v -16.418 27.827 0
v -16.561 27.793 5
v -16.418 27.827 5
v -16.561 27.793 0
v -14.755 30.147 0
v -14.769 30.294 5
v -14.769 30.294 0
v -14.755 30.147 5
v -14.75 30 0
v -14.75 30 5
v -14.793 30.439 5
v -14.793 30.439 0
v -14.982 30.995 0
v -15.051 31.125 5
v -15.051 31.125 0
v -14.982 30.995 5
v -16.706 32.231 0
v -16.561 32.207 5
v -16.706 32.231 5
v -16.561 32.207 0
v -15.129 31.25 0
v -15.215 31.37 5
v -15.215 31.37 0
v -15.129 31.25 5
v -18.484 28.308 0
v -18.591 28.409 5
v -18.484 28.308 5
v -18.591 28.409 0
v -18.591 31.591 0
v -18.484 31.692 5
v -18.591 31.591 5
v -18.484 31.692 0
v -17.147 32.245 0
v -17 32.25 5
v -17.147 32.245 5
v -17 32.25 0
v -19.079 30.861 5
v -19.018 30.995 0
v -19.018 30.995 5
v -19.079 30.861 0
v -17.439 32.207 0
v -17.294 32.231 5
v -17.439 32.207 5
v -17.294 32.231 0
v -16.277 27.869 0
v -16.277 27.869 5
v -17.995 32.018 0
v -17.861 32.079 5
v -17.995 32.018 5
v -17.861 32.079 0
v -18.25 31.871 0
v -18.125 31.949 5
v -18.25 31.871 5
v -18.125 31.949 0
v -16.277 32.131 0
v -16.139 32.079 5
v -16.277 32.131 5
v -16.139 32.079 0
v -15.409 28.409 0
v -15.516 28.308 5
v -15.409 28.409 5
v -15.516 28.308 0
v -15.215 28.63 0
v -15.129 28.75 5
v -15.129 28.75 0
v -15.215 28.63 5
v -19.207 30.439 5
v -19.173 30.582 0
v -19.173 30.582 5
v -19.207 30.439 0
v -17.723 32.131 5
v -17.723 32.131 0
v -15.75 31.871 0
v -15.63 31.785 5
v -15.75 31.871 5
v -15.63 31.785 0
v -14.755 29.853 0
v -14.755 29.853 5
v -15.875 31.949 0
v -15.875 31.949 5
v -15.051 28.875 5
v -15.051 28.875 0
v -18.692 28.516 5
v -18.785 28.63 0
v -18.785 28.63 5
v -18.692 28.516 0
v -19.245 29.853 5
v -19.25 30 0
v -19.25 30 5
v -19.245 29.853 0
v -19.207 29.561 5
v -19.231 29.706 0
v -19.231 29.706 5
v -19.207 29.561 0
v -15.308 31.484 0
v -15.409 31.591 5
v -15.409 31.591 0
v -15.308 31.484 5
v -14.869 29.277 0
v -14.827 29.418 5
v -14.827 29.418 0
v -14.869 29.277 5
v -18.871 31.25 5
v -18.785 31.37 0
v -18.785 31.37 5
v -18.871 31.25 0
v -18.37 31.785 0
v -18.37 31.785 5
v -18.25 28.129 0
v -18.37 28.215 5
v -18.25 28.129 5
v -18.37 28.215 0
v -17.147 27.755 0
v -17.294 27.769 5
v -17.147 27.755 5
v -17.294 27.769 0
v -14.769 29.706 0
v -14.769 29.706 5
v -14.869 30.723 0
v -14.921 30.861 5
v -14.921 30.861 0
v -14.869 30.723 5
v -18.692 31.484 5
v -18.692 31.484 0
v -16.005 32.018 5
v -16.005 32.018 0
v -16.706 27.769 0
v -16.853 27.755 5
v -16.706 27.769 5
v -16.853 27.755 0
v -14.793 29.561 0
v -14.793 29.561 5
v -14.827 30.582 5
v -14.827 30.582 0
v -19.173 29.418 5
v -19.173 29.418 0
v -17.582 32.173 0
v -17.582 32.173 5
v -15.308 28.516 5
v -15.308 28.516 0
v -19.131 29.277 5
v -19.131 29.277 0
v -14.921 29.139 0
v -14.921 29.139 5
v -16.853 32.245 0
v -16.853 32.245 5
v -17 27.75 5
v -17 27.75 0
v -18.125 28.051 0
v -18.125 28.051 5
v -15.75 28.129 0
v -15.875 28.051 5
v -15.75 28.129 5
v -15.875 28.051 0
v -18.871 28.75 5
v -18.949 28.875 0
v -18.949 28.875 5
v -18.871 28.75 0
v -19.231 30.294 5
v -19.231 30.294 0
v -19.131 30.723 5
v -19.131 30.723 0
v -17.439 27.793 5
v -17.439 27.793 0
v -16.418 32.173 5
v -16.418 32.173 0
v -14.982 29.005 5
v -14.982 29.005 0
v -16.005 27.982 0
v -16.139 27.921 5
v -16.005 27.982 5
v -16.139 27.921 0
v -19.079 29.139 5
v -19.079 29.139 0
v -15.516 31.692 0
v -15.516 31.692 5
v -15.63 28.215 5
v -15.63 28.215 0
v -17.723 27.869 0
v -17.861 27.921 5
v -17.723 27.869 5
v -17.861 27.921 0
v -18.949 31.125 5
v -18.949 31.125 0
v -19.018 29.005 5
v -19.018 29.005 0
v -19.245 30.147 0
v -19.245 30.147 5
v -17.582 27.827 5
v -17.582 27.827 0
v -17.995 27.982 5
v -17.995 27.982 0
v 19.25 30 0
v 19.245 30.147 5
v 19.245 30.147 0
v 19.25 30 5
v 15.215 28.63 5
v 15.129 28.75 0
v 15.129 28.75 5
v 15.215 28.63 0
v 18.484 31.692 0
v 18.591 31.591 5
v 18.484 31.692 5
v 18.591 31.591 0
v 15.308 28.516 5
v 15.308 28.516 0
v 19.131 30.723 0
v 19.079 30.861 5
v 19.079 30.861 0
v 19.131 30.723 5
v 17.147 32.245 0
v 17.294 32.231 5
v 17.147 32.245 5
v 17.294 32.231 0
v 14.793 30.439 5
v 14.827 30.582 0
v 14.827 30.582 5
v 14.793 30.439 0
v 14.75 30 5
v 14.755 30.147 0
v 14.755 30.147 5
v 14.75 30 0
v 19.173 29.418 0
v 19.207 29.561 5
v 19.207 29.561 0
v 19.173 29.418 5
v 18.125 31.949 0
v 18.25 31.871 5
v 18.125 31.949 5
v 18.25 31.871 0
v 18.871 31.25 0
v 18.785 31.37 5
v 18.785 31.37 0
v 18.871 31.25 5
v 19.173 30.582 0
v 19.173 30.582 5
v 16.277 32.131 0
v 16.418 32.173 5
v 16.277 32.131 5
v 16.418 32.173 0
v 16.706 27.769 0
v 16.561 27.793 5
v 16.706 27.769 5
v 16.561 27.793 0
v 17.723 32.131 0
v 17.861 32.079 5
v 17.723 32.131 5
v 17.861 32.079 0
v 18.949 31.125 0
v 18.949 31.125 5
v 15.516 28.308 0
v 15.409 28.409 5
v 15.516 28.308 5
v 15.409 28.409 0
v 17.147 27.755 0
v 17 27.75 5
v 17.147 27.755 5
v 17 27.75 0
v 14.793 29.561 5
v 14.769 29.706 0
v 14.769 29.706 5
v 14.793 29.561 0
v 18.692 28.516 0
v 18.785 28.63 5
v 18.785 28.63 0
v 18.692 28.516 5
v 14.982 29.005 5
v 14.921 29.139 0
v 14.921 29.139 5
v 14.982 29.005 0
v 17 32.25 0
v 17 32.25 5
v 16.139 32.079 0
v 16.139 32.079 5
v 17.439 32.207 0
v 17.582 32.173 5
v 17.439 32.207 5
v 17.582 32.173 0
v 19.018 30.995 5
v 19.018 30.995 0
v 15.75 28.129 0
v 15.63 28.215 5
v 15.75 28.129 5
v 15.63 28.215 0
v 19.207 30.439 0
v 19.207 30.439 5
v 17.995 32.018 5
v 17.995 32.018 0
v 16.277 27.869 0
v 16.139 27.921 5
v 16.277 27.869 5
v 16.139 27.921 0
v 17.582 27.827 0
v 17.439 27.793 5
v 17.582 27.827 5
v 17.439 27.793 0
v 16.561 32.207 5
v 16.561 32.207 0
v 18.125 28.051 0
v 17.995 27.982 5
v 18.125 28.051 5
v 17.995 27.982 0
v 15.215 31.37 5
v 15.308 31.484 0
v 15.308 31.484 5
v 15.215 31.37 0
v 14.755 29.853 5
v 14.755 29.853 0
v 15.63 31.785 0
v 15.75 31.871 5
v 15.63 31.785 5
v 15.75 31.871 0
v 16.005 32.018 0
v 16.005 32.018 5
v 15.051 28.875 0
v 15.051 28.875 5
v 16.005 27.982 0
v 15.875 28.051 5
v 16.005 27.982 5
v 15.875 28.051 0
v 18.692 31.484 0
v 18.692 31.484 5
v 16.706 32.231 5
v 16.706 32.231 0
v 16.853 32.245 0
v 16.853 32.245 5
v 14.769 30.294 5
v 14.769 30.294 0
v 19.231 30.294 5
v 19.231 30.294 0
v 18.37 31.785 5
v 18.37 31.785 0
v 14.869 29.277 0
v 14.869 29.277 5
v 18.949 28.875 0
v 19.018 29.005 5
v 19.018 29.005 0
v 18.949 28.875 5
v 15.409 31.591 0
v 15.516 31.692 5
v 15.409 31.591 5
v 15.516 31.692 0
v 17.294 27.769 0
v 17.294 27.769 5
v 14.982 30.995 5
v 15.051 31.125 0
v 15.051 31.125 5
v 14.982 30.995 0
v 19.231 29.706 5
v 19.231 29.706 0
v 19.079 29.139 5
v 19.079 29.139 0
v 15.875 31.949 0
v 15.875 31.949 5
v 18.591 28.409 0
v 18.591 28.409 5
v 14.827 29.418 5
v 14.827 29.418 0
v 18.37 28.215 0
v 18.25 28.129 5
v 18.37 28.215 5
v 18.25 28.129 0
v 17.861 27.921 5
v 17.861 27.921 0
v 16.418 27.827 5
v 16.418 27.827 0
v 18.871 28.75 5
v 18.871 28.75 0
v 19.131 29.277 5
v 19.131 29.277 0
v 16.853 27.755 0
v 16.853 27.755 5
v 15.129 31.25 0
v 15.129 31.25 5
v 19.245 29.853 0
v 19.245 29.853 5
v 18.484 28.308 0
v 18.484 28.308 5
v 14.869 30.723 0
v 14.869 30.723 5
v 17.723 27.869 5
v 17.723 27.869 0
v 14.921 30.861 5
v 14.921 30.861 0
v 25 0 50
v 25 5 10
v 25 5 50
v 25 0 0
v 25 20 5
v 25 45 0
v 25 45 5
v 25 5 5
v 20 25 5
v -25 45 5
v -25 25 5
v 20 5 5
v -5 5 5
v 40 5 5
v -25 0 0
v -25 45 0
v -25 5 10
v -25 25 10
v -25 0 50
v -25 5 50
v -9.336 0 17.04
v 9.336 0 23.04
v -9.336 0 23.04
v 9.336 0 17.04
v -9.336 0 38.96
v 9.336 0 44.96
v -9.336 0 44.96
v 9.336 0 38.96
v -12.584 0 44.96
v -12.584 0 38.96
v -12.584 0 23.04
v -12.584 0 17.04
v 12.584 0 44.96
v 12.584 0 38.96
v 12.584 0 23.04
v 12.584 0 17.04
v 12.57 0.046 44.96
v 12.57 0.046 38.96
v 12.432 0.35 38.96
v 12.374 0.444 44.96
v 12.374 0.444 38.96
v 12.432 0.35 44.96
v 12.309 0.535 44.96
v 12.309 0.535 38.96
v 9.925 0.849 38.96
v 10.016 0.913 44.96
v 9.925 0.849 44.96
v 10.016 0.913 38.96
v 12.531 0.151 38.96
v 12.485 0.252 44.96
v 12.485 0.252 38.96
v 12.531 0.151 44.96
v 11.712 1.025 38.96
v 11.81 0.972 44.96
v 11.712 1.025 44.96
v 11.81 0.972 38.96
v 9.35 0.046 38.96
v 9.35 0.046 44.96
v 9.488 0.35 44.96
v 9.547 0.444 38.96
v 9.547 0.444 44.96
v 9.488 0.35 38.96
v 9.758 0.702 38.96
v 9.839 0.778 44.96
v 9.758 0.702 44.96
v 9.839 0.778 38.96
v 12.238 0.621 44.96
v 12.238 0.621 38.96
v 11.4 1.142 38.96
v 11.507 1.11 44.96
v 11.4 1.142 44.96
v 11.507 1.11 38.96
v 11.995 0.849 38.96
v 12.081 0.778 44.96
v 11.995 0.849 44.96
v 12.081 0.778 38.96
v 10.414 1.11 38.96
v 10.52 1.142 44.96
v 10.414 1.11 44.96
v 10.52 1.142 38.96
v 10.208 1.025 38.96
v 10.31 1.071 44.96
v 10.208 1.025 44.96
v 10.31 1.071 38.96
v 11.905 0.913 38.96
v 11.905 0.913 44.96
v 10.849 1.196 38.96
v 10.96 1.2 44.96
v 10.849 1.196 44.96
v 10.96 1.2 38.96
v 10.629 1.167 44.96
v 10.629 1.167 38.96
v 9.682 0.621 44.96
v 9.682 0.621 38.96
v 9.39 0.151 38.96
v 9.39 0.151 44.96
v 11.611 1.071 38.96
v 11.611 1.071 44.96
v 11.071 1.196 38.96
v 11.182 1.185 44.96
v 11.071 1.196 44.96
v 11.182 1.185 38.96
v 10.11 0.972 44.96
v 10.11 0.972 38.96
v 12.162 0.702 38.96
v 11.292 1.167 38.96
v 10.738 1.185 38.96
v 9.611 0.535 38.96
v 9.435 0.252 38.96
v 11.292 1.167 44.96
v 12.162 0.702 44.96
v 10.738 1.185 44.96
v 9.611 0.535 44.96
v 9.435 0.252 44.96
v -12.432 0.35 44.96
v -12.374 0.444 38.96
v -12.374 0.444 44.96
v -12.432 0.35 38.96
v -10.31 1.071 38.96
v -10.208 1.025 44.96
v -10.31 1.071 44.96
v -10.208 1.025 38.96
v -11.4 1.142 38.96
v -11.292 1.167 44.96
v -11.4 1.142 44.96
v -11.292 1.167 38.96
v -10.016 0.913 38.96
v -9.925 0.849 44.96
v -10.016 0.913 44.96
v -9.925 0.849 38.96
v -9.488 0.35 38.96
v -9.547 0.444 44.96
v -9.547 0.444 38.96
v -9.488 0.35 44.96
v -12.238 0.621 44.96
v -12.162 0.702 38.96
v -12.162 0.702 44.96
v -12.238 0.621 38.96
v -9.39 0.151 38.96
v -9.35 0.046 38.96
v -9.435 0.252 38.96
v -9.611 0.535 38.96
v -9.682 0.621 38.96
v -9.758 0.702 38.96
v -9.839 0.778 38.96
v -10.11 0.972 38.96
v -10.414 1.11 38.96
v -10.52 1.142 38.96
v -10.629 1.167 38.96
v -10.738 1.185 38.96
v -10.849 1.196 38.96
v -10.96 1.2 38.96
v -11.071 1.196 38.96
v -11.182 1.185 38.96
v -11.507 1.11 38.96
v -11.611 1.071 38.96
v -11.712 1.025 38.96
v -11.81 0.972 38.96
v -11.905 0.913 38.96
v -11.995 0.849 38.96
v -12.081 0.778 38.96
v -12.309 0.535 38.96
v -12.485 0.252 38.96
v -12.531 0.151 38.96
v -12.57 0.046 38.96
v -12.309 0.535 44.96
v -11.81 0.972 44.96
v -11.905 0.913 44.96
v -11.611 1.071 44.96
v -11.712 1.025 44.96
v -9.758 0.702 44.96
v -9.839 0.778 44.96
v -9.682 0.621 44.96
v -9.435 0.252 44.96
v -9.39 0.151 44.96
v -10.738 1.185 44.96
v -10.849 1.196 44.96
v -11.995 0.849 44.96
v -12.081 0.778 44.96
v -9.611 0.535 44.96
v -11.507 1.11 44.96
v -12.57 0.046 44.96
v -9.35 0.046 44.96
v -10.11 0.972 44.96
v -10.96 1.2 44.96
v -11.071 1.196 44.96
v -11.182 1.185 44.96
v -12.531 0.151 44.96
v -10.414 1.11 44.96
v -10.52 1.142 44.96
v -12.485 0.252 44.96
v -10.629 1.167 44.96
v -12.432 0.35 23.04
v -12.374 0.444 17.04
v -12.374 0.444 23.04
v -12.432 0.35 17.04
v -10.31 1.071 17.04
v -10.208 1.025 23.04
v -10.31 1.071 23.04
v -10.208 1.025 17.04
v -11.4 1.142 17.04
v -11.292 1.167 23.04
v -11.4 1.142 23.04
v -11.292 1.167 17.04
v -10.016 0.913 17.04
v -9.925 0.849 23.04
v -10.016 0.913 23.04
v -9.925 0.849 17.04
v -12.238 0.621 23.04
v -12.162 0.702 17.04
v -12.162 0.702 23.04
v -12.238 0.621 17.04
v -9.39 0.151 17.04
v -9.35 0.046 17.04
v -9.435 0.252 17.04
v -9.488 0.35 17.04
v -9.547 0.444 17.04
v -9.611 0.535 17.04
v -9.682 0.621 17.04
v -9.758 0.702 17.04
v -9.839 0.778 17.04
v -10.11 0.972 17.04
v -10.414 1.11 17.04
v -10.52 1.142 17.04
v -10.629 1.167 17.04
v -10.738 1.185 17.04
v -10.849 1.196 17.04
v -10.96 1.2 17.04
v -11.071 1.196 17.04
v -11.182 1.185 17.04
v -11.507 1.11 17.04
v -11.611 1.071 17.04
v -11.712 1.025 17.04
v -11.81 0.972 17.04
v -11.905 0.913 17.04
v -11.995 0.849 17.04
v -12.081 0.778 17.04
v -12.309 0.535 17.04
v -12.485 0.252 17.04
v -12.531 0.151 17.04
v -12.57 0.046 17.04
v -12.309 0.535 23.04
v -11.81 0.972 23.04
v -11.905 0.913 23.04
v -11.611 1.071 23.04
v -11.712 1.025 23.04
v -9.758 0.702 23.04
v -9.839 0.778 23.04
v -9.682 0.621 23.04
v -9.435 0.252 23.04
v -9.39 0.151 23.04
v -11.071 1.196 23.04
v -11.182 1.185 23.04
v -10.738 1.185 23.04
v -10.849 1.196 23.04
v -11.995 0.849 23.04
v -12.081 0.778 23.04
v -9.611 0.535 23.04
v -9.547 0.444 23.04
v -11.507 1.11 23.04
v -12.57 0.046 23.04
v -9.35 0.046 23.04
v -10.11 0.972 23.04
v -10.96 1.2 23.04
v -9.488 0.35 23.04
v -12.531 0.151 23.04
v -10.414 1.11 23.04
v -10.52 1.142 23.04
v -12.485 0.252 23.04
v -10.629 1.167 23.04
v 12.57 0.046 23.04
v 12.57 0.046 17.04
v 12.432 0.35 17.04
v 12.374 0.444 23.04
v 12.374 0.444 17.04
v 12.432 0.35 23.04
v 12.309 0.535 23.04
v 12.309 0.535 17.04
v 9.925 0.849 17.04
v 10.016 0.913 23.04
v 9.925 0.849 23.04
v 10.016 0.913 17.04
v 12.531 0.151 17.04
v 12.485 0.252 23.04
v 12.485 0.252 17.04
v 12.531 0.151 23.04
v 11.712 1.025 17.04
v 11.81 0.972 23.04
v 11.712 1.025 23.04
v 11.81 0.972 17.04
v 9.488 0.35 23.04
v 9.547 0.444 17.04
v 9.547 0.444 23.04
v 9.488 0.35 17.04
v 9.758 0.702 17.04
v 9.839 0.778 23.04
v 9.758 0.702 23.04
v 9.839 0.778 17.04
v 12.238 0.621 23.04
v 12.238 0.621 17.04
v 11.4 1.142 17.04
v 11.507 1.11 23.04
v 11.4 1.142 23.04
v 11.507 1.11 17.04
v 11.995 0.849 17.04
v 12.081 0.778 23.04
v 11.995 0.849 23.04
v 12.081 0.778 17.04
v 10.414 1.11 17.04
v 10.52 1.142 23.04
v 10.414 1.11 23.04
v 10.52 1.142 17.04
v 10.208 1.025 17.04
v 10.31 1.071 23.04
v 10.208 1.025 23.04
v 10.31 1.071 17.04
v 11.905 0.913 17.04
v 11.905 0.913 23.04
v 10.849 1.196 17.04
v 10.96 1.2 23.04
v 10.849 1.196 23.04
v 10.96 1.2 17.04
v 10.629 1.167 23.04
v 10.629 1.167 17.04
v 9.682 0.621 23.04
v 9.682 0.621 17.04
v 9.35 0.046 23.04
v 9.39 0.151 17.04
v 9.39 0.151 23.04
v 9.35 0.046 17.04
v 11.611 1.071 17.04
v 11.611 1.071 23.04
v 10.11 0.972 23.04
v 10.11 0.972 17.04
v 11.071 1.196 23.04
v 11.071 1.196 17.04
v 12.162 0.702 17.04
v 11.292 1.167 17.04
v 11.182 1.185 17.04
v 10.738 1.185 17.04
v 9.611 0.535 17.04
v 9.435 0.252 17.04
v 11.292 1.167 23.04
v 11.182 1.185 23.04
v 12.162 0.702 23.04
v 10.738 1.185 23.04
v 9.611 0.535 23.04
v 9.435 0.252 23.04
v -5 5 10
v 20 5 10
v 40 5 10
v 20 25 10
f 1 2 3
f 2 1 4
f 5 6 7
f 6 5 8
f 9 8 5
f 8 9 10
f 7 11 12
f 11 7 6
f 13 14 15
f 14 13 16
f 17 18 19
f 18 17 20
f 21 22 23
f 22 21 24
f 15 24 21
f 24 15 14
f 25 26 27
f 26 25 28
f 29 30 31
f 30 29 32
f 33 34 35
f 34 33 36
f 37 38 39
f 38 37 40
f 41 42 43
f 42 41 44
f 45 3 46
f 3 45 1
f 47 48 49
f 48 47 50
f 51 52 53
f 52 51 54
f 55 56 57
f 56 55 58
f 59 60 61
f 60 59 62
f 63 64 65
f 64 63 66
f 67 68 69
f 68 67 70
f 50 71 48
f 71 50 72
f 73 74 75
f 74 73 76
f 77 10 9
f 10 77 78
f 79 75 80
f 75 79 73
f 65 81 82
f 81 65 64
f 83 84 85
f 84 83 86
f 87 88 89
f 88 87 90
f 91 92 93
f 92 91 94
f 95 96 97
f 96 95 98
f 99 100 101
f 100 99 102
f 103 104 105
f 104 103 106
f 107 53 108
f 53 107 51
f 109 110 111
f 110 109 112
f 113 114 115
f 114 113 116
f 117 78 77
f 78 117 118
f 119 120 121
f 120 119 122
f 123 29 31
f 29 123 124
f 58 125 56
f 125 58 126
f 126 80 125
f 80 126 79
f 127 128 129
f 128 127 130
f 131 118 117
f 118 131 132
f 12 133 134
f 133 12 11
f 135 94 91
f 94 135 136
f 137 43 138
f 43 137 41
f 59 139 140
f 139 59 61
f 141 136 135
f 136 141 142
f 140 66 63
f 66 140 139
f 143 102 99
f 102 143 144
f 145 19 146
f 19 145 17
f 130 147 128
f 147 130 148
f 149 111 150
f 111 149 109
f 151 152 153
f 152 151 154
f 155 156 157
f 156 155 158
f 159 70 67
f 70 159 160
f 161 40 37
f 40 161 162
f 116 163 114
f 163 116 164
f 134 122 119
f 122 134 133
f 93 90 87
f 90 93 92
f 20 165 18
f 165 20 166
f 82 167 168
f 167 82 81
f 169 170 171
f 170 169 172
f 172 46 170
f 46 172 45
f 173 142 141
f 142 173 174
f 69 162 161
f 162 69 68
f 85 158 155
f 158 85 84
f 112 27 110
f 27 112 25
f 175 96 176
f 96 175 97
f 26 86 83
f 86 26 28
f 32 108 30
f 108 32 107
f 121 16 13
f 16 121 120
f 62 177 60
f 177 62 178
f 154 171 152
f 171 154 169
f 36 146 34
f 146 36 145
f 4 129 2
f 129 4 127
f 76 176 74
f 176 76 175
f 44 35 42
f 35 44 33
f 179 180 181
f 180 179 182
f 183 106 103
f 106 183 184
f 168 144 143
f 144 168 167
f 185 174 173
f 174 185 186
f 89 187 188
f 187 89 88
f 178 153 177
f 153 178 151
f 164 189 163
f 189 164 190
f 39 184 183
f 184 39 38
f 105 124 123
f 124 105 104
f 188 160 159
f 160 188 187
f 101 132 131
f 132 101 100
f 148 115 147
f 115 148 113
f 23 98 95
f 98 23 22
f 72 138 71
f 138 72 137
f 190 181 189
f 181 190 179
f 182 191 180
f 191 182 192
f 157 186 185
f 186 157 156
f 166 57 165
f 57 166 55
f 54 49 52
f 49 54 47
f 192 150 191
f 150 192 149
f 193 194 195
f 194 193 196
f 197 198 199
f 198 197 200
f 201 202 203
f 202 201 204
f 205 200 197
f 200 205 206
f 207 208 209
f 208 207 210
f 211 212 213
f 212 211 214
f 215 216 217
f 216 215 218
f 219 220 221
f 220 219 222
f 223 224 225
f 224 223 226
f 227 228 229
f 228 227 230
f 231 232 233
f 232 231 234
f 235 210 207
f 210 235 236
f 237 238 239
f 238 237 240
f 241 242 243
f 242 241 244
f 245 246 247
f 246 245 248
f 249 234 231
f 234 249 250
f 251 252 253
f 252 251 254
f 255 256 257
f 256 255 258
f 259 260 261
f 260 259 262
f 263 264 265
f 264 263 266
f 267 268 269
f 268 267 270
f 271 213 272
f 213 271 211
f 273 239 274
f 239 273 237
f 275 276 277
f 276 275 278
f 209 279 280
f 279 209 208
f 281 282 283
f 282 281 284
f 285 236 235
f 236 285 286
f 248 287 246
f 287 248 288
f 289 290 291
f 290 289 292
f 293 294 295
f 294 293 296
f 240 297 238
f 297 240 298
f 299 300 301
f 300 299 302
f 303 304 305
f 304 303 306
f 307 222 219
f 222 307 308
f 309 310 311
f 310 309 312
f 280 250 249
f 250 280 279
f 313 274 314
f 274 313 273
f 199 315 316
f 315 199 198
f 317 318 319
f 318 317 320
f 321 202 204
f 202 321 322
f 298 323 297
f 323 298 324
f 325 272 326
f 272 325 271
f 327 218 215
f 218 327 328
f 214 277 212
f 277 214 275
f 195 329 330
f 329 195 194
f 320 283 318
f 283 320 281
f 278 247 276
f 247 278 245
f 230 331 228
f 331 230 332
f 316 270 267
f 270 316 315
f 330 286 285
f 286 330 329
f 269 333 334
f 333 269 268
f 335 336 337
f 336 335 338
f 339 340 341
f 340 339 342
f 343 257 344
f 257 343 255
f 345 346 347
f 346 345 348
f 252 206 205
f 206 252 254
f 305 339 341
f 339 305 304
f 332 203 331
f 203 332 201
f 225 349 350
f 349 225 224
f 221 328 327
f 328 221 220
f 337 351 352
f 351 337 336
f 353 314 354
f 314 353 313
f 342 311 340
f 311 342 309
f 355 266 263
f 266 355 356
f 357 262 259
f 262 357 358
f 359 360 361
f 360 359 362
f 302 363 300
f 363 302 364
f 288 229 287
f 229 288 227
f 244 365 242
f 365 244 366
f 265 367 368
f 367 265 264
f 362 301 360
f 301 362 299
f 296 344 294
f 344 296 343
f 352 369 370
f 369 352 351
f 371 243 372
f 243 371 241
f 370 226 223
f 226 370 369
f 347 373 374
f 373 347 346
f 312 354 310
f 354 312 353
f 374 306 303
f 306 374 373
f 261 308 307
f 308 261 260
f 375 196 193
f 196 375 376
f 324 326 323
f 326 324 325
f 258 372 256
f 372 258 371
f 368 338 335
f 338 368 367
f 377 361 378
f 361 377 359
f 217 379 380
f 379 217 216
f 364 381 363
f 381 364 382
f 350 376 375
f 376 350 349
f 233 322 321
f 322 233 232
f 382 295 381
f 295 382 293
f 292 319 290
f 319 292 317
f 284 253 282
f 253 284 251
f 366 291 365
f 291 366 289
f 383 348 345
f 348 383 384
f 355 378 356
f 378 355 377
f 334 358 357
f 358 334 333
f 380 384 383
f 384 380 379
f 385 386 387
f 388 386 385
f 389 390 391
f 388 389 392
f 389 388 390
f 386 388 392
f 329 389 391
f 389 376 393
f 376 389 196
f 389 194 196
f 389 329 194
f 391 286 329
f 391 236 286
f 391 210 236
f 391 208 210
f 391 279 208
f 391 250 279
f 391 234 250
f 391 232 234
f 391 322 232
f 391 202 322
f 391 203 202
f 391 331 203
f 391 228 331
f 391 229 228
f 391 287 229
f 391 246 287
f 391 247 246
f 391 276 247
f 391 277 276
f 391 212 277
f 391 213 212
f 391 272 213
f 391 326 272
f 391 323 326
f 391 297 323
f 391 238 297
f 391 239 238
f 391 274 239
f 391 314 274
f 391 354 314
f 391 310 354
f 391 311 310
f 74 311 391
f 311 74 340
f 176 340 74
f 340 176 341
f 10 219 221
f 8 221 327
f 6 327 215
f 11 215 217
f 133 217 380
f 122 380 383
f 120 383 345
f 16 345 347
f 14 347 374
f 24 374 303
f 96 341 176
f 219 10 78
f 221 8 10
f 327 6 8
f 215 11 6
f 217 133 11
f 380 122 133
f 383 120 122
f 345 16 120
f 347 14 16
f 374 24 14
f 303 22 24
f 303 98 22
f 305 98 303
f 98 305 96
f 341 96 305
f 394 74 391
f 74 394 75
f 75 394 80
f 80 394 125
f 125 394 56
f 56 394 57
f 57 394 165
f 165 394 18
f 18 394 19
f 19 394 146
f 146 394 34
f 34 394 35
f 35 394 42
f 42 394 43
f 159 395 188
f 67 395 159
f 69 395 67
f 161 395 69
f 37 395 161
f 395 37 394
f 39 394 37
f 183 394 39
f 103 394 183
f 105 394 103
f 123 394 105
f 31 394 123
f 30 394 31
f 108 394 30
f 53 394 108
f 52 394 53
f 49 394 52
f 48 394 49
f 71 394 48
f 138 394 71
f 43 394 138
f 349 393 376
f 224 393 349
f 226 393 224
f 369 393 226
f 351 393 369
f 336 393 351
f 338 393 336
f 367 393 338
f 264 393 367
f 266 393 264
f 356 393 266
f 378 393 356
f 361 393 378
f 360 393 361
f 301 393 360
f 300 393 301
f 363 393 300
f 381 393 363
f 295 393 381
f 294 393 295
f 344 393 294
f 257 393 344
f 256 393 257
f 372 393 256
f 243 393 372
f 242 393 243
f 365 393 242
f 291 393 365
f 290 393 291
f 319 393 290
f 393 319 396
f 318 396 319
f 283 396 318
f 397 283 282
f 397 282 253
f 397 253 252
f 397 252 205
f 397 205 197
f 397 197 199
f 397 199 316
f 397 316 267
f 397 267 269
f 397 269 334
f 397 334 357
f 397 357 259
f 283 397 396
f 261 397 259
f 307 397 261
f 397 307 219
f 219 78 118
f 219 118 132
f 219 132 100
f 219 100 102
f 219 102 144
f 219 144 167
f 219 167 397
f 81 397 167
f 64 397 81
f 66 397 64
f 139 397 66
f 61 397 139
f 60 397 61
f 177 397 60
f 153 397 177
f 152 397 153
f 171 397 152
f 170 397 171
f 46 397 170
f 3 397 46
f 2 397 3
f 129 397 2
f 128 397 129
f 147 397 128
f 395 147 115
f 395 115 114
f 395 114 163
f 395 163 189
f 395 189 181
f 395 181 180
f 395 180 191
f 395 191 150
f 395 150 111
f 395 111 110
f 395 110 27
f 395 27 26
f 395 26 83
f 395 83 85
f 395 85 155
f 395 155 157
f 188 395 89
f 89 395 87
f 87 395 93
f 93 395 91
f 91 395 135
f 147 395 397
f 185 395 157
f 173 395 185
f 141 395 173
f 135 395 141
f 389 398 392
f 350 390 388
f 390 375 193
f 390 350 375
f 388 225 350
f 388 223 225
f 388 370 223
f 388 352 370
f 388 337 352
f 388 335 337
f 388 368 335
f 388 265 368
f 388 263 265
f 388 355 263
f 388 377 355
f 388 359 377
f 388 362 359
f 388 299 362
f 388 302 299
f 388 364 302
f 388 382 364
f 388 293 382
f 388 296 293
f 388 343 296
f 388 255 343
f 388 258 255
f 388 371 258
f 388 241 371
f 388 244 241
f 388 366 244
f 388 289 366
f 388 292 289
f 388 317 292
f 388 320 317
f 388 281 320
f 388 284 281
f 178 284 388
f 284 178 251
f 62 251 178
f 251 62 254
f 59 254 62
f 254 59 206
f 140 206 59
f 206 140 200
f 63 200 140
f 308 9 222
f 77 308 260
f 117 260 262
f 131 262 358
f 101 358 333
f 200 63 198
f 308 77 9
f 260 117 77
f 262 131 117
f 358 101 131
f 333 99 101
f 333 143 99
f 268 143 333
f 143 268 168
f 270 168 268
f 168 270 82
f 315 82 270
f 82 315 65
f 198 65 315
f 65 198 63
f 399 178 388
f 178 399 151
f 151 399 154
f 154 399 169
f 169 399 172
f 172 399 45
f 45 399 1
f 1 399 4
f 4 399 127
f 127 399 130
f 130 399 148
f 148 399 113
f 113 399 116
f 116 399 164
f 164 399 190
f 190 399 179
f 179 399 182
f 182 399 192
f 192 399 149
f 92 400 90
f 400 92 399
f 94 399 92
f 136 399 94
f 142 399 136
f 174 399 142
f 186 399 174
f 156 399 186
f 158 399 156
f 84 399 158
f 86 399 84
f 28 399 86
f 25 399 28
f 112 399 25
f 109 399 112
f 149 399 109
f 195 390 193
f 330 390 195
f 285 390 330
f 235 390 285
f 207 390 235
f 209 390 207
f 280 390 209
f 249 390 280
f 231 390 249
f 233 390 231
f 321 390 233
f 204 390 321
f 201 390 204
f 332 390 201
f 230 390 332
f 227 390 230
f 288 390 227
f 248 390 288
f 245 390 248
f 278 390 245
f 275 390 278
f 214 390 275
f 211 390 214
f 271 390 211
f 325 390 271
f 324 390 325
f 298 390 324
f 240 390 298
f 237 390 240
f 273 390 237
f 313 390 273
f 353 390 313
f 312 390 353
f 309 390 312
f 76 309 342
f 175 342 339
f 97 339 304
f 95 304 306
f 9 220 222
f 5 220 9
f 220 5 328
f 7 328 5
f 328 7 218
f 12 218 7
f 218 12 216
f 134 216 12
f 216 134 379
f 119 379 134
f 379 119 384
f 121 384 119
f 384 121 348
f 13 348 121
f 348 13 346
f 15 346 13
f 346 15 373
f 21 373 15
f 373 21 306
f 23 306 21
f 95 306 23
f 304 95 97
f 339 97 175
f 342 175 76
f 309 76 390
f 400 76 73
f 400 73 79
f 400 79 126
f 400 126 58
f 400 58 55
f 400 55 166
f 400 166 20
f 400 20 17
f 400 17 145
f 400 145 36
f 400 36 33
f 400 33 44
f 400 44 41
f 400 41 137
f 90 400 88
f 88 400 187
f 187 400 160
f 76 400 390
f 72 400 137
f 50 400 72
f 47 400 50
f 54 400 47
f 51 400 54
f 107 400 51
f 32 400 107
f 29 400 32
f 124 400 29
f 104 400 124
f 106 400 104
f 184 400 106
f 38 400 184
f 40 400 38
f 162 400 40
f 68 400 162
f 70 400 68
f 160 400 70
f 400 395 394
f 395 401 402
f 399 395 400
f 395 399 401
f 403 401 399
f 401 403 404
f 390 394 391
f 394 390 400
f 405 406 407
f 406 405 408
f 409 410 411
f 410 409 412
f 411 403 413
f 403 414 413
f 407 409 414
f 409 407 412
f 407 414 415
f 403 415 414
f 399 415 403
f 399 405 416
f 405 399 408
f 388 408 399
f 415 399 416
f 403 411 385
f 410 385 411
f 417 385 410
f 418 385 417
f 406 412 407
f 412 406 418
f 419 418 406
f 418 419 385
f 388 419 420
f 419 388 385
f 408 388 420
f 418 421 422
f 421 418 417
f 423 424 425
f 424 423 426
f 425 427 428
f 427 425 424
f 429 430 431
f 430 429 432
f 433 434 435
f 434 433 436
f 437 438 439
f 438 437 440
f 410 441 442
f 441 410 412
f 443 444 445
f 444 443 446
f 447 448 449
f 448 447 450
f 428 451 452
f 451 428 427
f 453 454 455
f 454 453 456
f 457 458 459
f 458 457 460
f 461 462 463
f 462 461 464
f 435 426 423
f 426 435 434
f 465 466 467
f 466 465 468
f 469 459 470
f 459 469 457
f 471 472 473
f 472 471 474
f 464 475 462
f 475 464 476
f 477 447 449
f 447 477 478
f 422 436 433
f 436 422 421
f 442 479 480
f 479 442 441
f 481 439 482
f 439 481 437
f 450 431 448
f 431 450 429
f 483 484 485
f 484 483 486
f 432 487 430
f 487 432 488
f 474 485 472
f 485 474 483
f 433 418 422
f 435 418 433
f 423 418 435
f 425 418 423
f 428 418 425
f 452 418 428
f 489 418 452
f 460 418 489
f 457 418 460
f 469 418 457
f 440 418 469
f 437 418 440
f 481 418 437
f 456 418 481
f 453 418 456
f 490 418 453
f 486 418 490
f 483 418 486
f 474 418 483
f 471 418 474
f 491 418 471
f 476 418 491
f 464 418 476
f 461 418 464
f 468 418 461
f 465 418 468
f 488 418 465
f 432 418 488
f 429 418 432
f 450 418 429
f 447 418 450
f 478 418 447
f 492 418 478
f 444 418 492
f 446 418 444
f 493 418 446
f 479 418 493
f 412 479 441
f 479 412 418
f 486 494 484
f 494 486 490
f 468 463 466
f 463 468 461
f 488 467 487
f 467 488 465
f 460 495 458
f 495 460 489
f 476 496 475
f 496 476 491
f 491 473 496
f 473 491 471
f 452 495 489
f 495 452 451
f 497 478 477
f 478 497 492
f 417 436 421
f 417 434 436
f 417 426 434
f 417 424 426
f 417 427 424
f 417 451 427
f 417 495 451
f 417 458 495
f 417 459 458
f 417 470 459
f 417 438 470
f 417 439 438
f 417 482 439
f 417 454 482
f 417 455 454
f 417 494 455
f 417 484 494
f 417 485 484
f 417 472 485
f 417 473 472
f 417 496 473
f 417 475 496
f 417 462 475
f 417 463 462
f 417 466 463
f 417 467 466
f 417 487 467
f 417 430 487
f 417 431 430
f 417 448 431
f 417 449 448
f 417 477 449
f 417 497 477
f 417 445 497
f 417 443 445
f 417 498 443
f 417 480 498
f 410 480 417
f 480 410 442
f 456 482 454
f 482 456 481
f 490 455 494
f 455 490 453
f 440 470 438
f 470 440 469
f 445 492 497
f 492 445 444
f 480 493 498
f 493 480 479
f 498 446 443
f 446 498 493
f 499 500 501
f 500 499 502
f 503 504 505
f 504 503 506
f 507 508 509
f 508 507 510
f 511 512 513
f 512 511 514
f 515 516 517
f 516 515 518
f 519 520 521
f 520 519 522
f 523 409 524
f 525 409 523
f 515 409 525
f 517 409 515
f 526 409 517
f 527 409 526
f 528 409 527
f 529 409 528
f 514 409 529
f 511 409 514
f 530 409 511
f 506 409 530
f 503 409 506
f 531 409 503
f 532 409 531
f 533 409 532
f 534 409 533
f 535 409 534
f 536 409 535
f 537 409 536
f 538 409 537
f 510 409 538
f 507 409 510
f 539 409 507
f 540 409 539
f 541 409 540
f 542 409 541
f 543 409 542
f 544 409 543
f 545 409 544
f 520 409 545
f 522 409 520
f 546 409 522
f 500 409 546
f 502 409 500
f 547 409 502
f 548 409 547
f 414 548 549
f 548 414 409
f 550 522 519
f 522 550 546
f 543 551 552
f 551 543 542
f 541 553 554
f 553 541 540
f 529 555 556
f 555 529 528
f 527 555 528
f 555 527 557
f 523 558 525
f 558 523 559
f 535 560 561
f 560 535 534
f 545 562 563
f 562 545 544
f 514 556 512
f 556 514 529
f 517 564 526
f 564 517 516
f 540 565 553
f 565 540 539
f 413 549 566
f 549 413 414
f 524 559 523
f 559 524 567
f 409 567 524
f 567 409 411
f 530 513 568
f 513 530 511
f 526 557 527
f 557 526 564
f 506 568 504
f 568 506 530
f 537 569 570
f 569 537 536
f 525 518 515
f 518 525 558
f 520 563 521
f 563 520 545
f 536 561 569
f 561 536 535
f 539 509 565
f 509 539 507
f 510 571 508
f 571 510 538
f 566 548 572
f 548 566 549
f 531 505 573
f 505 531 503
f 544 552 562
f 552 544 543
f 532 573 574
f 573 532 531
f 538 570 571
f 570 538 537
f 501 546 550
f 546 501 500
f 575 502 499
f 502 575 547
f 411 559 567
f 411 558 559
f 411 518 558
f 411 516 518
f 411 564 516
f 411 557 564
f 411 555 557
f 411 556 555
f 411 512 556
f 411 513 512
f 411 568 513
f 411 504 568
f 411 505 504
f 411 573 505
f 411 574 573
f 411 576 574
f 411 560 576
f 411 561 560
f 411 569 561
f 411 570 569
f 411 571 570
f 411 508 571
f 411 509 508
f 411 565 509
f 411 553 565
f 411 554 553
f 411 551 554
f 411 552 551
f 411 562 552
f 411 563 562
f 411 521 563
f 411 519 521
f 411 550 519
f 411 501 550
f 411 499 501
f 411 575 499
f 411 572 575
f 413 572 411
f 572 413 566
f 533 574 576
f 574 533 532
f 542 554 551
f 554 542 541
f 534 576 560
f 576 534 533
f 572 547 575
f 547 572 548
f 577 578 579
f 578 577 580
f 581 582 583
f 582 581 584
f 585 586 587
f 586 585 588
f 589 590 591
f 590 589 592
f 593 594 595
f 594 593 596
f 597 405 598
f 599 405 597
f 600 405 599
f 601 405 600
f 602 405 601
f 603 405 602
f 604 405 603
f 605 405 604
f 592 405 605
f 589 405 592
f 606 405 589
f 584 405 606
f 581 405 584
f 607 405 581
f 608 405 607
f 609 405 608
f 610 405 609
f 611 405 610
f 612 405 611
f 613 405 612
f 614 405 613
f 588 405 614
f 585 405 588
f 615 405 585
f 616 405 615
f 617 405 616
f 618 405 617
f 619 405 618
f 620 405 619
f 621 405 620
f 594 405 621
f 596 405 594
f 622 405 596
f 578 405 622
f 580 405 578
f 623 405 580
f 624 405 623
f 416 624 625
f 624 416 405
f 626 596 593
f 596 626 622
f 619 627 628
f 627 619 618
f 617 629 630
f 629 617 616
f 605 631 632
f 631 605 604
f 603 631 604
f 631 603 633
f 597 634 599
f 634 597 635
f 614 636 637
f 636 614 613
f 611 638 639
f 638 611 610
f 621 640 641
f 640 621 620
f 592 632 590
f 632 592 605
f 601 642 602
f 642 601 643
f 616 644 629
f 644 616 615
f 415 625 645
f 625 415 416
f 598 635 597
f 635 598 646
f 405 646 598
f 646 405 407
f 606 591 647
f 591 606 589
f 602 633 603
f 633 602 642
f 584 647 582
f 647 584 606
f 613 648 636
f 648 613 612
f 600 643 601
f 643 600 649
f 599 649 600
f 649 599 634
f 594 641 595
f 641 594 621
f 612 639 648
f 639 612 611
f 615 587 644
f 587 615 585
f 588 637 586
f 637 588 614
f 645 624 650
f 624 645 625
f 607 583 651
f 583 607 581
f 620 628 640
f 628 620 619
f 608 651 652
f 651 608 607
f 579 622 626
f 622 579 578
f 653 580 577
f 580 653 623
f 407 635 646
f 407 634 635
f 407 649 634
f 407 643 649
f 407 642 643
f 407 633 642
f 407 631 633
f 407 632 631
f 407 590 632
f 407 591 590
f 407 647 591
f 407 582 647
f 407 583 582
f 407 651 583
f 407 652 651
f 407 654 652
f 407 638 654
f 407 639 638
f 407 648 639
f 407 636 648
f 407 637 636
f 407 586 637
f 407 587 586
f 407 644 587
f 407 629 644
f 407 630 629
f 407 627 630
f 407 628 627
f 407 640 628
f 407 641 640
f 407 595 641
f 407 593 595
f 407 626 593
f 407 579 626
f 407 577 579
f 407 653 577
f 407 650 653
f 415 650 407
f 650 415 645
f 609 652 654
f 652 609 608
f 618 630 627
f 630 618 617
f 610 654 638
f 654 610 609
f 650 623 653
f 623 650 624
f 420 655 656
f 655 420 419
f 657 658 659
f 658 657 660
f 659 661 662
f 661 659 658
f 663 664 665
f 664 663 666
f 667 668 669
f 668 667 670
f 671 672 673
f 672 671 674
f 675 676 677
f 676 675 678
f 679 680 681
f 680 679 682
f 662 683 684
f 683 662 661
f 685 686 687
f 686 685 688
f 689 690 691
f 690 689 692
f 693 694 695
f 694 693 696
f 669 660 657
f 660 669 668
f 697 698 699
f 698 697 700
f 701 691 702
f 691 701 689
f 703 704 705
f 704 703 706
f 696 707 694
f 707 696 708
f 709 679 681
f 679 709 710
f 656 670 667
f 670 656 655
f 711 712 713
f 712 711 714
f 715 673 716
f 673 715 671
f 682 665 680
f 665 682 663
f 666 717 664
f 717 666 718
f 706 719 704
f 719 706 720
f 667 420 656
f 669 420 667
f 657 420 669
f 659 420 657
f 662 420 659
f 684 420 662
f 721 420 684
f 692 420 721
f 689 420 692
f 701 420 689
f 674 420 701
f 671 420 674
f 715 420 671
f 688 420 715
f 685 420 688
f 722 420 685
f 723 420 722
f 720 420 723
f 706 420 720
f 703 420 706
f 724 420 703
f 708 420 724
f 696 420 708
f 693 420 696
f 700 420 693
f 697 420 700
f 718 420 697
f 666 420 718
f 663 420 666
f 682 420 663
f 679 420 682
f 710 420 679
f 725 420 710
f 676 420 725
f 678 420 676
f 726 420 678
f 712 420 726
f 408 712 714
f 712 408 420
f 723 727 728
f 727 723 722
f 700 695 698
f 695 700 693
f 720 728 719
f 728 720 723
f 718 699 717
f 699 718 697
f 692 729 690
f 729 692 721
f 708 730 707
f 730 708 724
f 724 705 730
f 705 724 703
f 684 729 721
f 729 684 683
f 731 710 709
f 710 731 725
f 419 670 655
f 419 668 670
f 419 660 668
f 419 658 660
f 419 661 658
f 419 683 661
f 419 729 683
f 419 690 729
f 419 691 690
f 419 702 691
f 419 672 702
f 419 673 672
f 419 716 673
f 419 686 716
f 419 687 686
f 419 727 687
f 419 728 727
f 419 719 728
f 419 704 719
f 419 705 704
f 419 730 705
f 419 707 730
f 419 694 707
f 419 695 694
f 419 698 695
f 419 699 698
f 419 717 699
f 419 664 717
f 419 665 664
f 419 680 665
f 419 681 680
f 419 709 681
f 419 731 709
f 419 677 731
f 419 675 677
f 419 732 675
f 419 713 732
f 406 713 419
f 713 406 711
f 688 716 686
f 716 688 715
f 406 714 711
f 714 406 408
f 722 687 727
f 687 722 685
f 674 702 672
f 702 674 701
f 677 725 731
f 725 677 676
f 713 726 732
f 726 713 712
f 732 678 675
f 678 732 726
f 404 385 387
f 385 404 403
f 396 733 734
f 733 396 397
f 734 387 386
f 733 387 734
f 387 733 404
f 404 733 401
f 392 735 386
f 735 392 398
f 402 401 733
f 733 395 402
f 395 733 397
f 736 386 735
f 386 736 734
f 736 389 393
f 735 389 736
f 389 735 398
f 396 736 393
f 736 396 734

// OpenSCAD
// L-shaped mounting bracket for NEMA 17 stepper motor (syringe pump)
// Print orientation: base plate on bed, vertical motor plate builds up +Z

// ---------- Base plate ----------
base_x0 = -25;      // base plate x start
base_x1 = 25;       // base plate x end
base_y0 = 0;        // base plate y start
base_y1 = 45;       // base plate y end
base_z0 = 0;        // base plate z start
base_z1 = 5;        // base plate z end
base_hole_count = 2;// number of M4 through-holes in base
base_hole_d = 4.5;  // M4 hole diameter
base_hole_x = [-17, 17]; // hole x positions
base_hole_y = 30;   // hole y position

// ---------- Vertical motor plate ----------
motor_x0 = -25;     // motor plate x start
motor_x1 = 25;      // motor plate x end
motor_y0 = 0;       // motor plate y start
motor_y1 = 5;       // motor plate y end
motor_z0 = 0;       // motor plate z start
motor_z1 = 50;      // motor plate z end
motor_boss_d = 23;  // motor centring boss hole diameter
motor_boss_x = 0;   // boss hole x centre
motor_boss_z = 28;  // boss hole z centre
motor_screw_count = 4; // M3 screw holes around boss
motor_screw_d = 3.4; // M3 hole diameter
motor_screw_pitch = 31; // square pattern side
motor_screw_start_angle = 45; // first hole at this angle (deg)

// ---------- Gussets ----------
gusset_t = 5;       // gusset thickness (along X)
gusset_leg = 20;    // right triangle legs along +Y and +Z
gusset_y0 = 5;      // right-angle corner y
gusset_z0 = 5;      // right-angle corner z

// ---------- Misc ----------
eps = 0.5;          // cutter overshoot past faces
$fn = 96;           // curve resolution

// ---------- Model ----------
union() {
    // Base plate with through-holes
    difference() {
        translate([base_x0, base_y0, base_z0])
            cube([base_x1 - base_x0, base_y1 - base_y0, base_z1 - base_z0]);
        for (i = [0 : base_hole_count - 1])
            translate([base_hole_x[i], base_hole_y, base_z0 - eps])
                cylinder(d = base_hole_d, h = base_z1 - base_z0 + 2 * eps);
    }

    // Vertical motor plate with boss hole and M3 screw holes
    difference() {
        translate([motor_x0, motor_y0, motor_z0])
            cube([motor_x1 - motor_x0, motor_y1 - motor_y0, motor_z1 - motor_z0]);
        // Boss hole along Y
        translate([motor_boss_x, motor_y0 - eps, motor_boss_z])
            rotate([90, 0, 0])
                cylinder(d = motor_boss_d, h = motor_y1 - motor_y0 + 2 * eps);
        // M3 screw holes on square pattern
        for (j = [0 : motor_screw_count - 1]) {
            a = motor_screw_start_angle + j * 90;
            translate([motor_boss_x + (motor_screw_pitch / 2) * cos(a),
                       motor_y0 - eps,
                       motor_boss_z + (motor_screw_pitch / 2) * sin(a)])
                cylinder(d = motor_screw_d, h = motor_y1 - motor_y0 + 2 * eps);
        }
    }

    // Gussets flush with left and right edges
    for (sx = [-1, 1]) {
        x0 = sx < 0 ? base_x0 : base_x1 - gusset_t;
        x1 = x0 + gusset_t;
        translate([x0, gusset_y0, gusset_z0])
            linear_extrude(x1 - x0)
                polygon([[0, 0], [gusset_leg, 0], [0, gusset_leg]]);
    }
}
